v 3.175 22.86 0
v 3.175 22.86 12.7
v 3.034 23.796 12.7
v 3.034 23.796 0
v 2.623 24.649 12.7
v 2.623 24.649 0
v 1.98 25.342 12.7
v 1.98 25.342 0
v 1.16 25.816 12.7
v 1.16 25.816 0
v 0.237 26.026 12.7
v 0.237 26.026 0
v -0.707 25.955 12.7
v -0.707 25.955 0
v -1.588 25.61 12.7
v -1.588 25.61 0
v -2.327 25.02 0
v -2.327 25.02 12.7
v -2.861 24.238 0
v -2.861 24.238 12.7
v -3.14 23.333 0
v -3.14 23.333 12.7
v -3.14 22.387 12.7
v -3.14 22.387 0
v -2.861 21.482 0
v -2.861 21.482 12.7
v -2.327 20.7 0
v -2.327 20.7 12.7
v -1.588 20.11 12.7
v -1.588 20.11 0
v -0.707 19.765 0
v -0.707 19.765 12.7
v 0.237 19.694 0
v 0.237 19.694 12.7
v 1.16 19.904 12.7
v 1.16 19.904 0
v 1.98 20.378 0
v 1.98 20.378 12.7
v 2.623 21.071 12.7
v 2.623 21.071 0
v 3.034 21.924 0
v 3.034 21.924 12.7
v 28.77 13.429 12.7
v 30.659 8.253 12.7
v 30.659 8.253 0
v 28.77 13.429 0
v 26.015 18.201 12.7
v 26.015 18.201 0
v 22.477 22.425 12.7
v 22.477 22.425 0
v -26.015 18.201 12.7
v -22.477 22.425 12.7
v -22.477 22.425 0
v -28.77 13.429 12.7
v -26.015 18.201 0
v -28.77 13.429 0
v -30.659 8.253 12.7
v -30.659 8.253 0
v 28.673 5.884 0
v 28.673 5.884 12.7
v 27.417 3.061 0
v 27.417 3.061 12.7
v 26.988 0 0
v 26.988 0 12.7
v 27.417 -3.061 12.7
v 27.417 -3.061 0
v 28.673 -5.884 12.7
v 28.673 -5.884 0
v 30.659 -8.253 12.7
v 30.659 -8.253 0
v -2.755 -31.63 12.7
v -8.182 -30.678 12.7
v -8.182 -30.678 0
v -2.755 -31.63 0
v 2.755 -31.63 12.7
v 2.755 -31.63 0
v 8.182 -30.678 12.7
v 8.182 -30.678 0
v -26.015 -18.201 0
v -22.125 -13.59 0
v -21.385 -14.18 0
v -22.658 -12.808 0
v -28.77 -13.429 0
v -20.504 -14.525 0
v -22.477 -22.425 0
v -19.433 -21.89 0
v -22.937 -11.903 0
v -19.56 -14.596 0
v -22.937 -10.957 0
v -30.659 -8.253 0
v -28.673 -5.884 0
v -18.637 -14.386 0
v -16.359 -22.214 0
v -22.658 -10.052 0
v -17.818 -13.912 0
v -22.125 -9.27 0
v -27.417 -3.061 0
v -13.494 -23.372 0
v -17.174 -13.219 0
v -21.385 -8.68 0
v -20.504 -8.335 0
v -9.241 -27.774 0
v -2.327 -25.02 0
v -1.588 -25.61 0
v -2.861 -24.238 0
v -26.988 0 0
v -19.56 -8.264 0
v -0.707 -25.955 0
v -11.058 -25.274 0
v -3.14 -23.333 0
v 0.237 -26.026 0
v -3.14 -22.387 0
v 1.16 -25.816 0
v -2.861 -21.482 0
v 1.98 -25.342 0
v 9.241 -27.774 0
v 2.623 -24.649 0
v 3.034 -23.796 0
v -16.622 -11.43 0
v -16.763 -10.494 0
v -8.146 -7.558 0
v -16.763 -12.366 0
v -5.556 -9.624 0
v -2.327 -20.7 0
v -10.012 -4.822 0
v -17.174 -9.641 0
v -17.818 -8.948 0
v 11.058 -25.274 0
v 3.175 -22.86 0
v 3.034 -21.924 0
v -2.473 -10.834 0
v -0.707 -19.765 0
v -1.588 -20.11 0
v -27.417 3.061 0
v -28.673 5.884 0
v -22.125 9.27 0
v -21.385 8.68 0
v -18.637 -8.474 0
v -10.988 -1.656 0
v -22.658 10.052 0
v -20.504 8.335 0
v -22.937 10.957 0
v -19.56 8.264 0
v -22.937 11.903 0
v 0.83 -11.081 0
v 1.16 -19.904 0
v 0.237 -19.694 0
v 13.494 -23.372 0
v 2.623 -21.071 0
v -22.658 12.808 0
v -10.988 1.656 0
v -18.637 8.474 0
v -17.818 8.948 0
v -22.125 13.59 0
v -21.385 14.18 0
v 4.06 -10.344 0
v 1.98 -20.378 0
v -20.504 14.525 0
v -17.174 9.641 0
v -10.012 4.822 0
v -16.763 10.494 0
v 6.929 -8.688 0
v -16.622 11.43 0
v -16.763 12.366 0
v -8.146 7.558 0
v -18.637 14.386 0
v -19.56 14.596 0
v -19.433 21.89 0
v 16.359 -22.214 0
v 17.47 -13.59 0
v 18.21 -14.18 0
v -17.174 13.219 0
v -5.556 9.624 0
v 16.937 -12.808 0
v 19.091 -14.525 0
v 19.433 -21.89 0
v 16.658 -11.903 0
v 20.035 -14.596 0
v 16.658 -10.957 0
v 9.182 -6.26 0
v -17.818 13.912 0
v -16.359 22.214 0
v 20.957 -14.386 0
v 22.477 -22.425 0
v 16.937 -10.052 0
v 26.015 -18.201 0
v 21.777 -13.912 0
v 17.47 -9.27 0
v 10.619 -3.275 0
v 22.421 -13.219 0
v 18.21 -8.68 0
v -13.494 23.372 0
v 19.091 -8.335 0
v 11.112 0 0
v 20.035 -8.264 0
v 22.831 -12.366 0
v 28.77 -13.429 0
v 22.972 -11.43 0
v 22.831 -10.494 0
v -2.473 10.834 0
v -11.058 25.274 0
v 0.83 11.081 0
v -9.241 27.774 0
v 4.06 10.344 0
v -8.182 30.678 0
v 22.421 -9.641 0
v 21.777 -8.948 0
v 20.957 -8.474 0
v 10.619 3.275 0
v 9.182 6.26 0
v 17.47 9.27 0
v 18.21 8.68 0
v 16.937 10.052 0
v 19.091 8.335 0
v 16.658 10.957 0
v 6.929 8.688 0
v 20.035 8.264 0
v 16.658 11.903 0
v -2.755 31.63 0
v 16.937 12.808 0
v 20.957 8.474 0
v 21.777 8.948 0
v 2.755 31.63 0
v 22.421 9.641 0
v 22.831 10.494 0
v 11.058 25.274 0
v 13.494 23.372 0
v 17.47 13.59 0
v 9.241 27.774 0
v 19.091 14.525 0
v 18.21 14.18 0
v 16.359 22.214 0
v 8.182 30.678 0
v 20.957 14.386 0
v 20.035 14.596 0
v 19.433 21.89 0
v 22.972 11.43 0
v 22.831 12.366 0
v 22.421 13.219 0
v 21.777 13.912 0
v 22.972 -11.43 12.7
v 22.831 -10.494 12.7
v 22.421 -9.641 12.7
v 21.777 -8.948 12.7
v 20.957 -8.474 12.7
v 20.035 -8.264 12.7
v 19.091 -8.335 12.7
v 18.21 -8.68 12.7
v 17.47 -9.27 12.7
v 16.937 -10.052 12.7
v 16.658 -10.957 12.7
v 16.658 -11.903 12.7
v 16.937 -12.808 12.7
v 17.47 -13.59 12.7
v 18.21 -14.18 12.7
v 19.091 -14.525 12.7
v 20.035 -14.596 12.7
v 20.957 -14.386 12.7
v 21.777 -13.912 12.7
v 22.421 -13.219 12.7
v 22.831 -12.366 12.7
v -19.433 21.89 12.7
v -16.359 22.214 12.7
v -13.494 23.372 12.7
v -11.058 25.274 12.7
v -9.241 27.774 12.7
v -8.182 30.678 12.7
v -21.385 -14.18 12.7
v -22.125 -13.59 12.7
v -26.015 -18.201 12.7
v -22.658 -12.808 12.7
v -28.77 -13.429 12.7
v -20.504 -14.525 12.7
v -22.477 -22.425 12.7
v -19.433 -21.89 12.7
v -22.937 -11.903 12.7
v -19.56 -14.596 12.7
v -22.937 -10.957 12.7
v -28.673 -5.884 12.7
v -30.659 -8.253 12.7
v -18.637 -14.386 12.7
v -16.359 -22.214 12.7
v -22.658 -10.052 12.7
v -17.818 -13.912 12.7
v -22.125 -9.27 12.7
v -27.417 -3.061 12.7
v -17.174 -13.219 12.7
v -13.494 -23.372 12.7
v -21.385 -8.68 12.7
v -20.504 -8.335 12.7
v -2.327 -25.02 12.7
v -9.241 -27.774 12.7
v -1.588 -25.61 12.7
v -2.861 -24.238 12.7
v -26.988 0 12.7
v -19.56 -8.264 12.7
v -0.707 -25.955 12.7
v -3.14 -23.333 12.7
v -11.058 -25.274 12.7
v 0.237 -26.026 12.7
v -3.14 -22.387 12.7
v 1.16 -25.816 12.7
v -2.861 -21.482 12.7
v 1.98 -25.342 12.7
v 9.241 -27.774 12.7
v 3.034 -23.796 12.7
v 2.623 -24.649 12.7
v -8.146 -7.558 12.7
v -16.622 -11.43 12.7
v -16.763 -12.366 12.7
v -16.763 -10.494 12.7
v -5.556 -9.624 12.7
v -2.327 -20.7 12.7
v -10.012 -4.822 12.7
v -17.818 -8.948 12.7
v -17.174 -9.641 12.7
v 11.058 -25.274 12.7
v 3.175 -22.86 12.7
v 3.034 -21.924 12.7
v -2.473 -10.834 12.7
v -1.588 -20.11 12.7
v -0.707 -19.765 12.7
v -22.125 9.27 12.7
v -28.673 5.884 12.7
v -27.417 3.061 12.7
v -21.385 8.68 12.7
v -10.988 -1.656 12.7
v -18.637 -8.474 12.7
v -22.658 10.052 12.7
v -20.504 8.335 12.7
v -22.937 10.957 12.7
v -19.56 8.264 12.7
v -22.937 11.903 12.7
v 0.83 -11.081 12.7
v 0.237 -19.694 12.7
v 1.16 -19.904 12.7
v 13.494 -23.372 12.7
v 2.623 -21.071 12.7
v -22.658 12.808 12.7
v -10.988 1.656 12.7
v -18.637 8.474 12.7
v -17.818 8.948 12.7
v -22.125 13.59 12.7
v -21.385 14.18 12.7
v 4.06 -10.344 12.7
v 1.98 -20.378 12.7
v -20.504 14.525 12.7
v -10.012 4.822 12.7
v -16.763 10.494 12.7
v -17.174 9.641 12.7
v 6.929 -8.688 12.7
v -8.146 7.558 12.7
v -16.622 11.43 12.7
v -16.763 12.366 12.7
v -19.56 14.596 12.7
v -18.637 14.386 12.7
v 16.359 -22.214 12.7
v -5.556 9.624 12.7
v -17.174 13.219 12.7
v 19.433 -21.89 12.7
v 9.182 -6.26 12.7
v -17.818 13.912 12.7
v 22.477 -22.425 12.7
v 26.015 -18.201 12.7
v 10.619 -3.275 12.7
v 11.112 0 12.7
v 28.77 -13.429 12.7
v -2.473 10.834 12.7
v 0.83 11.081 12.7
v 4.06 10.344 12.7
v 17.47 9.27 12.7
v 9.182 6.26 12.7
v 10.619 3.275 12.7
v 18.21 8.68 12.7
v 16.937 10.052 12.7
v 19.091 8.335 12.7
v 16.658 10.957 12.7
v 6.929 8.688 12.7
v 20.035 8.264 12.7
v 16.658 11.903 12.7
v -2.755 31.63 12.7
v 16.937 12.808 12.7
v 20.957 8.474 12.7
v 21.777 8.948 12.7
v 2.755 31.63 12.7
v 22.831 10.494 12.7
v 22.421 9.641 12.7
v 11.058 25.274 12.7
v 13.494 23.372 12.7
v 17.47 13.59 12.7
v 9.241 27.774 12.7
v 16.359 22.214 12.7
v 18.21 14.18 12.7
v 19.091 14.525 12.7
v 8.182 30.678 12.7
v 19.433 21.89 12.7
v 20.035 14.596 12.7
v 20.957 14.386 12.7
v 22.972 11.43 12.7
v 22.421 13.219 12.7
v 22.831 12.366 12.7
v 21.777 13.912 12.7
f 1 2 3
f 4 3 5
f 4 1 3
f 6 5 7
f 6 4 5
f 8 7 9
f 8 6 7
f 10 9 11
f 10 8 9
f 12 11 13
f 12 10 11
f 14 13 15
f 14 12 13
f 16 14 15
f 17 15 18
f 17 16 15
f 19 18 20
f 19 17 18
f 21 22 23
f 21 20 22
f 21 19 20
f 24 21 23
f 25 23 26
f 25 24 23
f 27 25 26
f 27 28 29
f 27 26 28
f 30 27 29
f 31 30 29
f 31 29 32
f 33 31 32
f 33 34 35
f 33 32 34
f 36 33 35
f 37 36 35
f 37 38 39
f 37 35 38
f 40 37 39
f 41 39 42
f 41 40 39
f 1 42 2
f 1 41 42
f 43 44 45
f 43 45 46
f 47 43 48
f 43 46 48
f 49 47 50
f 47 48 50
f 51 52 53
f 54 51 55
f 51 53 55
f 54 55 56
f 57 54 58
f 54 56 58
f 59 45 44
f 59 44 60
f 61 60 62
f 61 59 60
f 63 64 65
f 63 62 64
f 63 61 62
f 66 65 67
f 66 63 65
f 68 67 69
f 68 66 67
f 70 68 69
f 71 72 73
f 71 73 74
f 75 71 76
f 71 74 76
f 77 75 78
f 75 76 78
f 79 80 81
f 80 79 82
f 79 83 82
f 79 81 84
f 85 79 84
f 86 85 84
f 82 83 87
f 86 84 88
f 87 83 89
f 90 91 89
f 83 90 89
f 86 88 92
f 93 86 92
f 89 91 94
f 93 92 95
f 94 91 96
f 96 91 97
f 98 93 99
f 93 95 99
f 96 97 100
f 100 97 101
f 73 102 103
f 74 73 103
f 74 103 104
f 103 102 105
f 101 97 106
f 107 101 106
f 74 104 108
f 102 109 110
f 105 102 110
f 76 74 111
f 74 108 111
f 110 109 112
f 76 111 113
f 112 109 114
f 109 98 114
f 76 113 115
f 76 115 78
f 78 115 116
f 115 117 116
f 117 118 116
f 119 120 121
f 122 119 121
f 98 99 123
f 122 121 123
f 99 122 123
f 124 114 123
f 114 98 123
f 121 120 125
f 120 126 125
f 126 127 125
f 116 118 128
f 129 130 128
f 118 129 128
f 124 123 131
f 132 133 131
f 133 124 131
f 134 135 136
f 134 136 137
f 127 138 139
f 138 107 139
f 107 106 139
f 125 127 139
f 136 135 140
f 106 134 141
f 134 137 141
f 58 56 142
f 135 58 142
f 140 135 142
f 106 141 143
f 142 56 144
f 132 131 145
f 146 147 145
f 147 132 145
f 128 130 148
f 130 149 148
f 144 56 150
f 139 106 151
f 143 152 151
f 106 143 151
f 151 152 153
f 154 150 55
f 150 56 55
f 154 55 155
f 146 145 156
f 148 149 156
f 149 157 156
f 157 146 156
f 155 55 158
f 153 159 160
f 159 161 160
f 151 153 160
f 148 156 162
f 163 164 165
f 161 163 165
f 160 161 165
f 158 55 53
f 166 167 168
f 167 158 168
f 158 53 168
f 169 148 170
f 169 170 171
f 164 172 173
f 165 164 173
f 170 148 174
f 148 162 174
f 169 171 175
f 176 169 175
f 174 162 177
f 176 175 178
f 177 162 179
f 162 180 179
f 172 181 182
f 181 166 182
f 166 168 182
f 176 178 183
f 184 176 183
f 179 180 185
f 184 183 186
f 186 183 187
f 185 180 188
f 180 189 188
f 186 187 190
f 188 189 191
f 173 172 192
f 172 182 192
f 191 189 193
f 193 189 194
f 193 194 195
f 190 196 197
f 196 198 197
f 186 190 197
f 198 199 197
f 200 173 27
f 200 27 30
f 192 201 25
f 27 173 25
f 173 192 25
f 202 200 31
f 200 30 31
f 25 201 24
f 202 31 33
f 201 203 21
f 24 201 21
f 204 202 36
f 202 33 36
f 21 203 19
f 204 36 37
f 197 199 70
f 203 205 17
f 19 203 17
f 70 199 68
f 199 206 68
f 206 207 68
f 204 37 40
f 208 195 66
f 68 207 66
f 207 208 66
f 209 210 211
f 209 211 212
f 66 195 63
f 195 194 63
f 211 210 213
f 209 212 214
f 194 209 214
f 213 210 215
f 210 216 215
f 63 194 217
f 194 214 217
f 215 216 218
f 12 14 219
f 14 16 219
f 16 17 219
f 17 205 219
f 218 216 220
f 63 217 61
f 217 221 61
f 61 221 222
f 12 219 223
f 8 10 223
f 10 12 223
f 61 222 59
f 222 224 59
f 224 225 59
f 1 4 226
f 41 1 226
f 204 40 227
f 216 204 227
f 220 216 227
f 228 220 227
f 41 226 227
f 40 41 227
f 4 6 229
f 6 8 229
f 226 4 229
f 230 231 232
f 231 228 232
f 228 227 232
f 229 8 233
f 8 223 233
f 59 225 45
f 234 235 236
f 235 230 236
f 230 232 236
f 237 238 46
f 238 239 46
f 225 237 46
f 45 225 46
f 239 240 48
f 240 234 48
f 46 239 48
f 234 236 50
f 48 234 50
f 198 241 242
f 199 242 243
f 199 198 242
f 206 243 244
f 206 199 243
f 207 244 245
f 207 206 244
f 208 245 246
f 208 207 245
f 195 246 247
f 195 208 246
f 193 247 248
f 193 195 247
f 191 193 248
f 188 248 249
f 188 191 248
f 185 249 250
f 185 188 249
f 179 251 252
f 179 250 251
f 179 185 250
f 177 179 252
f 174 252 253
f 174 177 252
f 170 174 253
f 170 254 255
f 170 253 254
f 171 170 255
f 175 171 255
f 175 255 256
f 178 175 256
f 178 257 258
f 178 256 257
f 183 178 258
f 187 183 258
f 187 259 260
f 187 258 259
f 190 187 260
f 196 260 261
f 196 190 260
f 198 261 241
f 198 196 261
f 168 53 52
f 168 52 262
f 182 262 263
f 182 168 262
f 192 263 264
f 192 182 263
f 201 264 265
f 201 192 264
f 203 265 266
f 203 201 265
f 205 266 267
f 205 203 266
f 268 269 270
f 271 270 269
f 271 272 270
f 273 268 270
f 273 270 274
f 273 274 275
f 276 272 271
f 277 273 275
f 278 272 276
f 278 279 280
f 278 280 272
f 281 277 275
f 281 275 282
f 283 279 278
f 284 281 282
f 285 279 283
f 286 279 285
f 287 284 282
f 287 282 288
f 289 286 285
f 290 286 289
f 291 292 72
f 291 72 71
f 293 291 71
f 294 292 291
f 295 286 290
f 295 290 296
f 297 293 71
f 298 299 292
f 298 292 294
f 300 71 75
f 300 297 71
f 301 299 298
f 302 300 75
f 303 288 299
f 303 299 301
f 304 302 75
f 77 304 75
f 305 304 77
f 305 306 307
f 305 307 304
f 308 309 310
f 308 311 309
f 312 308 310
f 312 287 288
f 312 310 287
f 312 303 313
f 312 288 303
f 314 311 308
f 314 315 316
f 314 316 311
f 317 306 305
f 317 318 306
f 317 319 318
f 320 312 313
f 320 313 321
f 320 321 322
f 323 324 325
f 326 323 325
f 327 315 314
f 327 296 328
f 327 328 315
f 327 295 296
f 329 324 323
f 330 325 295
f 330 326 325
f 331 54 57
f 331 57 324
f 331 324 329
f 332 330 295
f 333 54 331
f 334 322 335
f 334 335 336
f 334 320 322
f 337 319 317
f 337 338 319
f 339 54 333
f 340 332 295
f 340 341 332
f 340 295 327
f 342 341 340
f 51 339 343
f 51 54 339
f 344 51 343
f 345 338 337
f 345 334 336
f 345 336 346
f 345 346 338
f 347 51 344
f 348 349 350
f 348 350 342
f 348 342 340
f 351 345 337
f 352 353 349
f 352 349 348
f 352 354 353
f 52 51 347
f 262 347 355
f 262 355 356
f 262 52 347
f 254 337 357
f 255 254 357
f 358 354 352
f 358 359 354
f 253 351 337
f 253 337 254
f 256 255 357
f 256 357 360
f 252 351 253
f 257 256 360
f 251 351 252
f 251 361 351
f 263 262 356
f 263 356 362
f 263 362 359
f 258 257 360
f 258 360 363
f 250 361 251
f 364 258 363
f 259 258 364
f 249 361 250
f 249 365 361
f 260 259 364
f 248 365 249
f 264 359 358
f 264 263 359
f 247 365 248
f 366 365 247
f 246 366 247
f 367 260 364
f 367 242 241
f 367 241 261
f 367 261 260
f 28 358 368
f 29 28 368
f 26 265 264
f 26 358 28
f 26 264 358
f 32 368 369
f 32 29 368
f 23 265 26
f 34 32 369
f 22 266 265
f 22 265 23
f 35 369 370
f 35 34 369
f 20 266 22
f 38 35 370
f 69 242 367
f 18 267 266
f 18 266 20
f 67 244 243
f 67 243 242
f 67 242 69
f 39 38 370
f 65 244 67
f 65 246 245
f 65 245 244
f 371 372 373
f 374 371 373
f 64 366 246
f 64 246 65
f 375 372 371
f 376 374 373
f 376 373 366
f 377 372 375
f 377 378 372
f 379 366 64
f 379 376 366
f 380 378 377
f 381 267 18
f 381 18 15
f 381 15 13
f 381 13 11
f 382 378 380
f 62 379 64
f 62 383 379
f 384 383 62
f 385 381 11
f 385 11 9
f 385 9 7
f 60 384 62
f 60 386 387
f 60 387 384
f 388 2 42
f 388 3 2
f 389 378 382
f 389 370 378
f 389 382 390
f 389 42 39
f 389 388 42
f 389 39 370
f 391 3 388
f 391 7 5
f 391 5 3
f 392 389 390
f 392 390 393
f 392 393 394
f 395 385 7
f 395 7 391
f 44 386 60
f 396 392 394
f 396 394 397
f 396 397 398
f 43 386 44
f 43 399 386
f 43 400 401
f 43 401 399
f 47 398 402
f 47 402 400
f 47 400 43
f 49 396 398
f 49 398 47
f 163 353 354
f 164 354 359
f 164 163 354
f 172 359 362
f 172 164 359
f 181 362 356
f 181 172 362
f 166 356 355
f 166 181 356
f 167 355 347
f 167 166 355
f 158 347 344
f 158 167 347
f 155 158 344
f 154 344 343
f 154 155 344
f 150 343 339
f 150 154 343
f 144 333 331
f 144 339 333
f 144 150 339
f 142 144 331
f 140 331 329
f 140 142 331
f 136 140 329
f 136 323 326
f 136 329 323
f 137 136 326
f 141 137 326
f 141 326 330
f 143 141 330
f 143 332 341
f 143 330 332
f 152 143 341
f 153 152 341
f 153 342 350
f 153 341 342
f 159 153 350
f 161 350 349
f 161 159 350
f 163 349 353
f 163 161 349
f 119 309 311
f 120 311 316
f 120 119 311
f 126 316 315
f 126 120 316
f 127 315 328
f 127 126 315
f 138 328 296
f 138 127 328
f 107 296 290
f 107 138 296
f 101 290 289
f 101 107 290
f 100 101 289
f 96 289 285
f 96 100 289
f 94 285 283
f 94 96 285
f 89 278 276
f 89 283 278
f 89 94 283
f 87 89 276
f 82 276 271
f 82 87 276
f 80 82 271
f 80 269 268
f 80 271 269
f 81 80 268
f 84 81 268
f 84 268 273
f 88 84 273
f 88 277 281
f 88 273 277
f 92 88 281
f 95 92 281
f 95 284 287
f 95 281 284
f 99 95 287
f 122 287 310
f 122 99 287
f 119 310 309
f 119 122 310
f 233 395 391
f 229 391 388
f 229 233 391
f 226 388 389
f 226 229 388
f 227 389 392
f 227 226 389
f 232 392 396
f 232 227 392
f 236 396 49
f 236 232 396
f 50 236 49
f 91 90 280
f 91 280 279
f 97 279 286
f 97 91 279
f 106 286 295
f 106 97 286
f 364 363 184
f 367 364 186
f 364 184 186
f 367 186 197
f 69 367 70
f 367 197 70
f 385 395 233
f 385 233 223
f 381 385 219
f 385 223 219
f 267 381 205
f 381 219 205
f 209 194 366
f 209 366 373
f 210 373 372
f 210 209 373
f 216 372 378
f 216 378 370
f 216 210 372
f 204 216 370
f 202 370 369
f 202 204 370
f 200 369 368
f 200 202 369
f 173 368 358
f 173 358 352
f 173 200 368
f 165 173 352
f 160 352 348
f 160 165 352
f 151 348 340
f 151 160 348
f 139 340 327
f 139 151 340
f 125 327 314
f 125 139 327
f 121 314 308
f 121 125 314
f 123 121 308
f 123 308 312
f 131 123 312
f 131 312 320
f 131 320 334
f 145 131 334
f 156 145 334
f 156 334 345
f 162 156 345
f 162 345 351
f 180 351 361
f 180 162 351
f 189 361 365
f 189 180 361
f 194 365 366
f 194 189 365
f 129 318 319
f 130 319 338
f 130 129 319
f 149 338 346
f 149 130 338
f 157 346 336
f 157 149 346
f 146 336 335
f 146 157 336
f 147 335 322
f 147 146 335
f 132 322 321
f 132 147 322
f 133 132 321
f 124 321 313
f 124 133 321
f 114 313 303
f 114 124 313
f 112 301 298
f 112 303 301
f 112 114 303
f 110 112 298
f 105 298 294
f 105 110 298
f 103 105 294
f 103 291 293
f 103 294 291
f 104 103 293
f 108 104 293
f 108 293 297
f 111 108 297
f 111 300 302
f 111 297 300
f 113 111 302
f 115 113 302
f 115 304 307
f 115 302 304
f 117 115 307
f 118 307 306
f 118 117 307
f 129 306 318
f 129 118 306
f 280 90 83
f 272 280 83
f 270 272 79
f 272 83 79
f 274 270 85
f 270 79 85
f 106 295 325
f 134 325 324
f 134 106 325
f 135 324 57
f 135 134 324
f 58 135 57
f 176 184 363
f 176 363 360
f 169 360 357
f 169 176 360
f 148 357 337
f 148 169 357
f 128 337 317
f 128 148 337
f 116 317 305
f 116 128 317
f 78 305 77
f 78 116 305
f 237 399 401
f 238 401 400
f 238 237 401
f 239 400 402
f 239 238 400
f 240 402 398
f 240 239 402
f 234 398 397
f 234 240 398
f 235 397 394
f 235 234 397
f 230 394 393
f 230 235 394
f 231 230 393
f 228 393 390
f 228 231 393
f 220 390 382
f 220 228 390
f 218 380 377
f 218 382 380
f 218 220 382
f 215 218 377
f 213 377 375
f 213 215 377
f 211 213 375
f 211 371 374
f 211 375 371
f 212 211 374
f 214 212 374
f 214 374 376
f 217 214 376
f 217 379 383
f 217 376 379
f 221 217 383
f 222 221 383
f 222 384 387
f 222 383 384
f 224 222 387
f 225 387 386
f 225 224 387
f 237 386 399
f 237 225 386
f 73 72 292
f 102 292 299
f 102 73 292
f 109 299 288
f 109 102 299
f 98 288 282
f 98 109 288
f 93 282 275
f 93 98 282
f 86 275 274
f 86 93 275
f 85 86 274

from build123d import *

# Parameters (mm, degrees)
F0_R     = 31.75
F0_R_2   = 11.1125
F1_DEPTH = 12.7
F3_DEPTH = 25.4
F4_R     = 3.175
F5_DEPTH = 25.4


with BuildPart() as f1:
    # F0 (on Top) → F1 (new body)
    with BuildSketch(Plane.XY):
        Circle(F0_R)
        Circle(F0_R_2, mode=Mode.SUBTRACT)
    extrude(amount=F1_DEPTH)

    # F2 (on Top) → F3 (cut)
    with BuildSketch(Plane.XY):
        with BuildLine():
            ThreePointArc((8.7188916363, -37.0889596596), (19.05, -32.9955678842), (27.760535447, -26.0952614797))
            ThreePointArc((27.760535447, -26.0952614797), (13.49375, -23.3718605846), (8.7188916363, -37.0889596596))
        make_face()
        with BuildLine():
            ThreePointArc((-27.760535447, -26.0952614797), (-19.05, -32.9955678842), (-8.7188916363, -37.0889596596))
            ThreePointArc((-8.7188916363, -37.0889596596), (-8.1345957944, -35.0792202734), (-7.9375, -32.9955678842))
            ThreePointArc((-7.9375, -32.9955678842), (-15.396793799, -22.500724355), (-27.760535447, -26.0952614797))
        make_face()
        with BuildLine():
            ThreePointArc((-26.9875, 0), (-29.68880886, 7.2621980045), (-36.4794270833, 10.9936981799))
            ThreePointArc((-36.4794270833, 10.9936981799), (-38.1, 0), (-36.4794270833, -10.9936981799))
            ThreePointArc((-36.4794270833, -10.9936981799), (-29.68880886, -7.2621980045), (-26.9875, 0))
        make_face()
        with BuildLine():
            ThreePointArc((-7.9375, 32.9955678842), (-8.1345957944, 35.0792202734), (-8.7188916363, 37.0889596596))
            ThreePointArc((-8.7188916363, 37.0889596596), (-19.05, 32.9955678842), (-27.760535447, 26.0952614797))
            ThreePointArc((-27.760535447, 26.0952614797), (-15.396793799, 22.500724355), (-7.9375, 32.9955678842))
        make_face()
        with BuildLine():
            ThreePointArc((8.7188916363, 37.0889596596), (13.49375, 23.3718605846), (27.760535447, 26.0952614797))
            ThreePointArc((27.760535447, 26.0952614797), (19.05, 32.9955678842), (8.7188916363, 37.0889596596))
        make_face()
        with BuildLine():
            ThreePointArc((36.4794270833, -10.9936981799), (37.6926794741, -5.55625), (38.1, 0))
            ThreePointArc((38.1, 0), (37.6926794741, 5.55625), (36.4794270833, 10.9936981799))
            ThreePointArc((36.4794270833, 10.9936981799), (26.9875, 0), (36.4794270833, -10.9936981799))
        make_face()
    extrude(amount=F3_DEPTH, mode=Mode.SUBTRACT)

    # F4 (on Top) → F5 (cut)
    with BuildSketch(Plane.XY):
        with Locations((0, 22.86)):
            Circle(F4_R)
        with Locations((-19.7973407305, 11.43)):
            Circle(F4_R)
        with Locations((-19.7973407305, -11.43)):
            Circle(F4_R)
        with Locations((0, -22.86)):
            Circle(F4_R)
        with Locations((19.7973407305, -11.43)):
            Circle(F4_R)
        with Locations((19.7973407305, 11.43)):
            Circle(F4_R)
    extrude(amount=F5_DEPTH, mode=Mode.SUBTRACT)


solid = f1.part
